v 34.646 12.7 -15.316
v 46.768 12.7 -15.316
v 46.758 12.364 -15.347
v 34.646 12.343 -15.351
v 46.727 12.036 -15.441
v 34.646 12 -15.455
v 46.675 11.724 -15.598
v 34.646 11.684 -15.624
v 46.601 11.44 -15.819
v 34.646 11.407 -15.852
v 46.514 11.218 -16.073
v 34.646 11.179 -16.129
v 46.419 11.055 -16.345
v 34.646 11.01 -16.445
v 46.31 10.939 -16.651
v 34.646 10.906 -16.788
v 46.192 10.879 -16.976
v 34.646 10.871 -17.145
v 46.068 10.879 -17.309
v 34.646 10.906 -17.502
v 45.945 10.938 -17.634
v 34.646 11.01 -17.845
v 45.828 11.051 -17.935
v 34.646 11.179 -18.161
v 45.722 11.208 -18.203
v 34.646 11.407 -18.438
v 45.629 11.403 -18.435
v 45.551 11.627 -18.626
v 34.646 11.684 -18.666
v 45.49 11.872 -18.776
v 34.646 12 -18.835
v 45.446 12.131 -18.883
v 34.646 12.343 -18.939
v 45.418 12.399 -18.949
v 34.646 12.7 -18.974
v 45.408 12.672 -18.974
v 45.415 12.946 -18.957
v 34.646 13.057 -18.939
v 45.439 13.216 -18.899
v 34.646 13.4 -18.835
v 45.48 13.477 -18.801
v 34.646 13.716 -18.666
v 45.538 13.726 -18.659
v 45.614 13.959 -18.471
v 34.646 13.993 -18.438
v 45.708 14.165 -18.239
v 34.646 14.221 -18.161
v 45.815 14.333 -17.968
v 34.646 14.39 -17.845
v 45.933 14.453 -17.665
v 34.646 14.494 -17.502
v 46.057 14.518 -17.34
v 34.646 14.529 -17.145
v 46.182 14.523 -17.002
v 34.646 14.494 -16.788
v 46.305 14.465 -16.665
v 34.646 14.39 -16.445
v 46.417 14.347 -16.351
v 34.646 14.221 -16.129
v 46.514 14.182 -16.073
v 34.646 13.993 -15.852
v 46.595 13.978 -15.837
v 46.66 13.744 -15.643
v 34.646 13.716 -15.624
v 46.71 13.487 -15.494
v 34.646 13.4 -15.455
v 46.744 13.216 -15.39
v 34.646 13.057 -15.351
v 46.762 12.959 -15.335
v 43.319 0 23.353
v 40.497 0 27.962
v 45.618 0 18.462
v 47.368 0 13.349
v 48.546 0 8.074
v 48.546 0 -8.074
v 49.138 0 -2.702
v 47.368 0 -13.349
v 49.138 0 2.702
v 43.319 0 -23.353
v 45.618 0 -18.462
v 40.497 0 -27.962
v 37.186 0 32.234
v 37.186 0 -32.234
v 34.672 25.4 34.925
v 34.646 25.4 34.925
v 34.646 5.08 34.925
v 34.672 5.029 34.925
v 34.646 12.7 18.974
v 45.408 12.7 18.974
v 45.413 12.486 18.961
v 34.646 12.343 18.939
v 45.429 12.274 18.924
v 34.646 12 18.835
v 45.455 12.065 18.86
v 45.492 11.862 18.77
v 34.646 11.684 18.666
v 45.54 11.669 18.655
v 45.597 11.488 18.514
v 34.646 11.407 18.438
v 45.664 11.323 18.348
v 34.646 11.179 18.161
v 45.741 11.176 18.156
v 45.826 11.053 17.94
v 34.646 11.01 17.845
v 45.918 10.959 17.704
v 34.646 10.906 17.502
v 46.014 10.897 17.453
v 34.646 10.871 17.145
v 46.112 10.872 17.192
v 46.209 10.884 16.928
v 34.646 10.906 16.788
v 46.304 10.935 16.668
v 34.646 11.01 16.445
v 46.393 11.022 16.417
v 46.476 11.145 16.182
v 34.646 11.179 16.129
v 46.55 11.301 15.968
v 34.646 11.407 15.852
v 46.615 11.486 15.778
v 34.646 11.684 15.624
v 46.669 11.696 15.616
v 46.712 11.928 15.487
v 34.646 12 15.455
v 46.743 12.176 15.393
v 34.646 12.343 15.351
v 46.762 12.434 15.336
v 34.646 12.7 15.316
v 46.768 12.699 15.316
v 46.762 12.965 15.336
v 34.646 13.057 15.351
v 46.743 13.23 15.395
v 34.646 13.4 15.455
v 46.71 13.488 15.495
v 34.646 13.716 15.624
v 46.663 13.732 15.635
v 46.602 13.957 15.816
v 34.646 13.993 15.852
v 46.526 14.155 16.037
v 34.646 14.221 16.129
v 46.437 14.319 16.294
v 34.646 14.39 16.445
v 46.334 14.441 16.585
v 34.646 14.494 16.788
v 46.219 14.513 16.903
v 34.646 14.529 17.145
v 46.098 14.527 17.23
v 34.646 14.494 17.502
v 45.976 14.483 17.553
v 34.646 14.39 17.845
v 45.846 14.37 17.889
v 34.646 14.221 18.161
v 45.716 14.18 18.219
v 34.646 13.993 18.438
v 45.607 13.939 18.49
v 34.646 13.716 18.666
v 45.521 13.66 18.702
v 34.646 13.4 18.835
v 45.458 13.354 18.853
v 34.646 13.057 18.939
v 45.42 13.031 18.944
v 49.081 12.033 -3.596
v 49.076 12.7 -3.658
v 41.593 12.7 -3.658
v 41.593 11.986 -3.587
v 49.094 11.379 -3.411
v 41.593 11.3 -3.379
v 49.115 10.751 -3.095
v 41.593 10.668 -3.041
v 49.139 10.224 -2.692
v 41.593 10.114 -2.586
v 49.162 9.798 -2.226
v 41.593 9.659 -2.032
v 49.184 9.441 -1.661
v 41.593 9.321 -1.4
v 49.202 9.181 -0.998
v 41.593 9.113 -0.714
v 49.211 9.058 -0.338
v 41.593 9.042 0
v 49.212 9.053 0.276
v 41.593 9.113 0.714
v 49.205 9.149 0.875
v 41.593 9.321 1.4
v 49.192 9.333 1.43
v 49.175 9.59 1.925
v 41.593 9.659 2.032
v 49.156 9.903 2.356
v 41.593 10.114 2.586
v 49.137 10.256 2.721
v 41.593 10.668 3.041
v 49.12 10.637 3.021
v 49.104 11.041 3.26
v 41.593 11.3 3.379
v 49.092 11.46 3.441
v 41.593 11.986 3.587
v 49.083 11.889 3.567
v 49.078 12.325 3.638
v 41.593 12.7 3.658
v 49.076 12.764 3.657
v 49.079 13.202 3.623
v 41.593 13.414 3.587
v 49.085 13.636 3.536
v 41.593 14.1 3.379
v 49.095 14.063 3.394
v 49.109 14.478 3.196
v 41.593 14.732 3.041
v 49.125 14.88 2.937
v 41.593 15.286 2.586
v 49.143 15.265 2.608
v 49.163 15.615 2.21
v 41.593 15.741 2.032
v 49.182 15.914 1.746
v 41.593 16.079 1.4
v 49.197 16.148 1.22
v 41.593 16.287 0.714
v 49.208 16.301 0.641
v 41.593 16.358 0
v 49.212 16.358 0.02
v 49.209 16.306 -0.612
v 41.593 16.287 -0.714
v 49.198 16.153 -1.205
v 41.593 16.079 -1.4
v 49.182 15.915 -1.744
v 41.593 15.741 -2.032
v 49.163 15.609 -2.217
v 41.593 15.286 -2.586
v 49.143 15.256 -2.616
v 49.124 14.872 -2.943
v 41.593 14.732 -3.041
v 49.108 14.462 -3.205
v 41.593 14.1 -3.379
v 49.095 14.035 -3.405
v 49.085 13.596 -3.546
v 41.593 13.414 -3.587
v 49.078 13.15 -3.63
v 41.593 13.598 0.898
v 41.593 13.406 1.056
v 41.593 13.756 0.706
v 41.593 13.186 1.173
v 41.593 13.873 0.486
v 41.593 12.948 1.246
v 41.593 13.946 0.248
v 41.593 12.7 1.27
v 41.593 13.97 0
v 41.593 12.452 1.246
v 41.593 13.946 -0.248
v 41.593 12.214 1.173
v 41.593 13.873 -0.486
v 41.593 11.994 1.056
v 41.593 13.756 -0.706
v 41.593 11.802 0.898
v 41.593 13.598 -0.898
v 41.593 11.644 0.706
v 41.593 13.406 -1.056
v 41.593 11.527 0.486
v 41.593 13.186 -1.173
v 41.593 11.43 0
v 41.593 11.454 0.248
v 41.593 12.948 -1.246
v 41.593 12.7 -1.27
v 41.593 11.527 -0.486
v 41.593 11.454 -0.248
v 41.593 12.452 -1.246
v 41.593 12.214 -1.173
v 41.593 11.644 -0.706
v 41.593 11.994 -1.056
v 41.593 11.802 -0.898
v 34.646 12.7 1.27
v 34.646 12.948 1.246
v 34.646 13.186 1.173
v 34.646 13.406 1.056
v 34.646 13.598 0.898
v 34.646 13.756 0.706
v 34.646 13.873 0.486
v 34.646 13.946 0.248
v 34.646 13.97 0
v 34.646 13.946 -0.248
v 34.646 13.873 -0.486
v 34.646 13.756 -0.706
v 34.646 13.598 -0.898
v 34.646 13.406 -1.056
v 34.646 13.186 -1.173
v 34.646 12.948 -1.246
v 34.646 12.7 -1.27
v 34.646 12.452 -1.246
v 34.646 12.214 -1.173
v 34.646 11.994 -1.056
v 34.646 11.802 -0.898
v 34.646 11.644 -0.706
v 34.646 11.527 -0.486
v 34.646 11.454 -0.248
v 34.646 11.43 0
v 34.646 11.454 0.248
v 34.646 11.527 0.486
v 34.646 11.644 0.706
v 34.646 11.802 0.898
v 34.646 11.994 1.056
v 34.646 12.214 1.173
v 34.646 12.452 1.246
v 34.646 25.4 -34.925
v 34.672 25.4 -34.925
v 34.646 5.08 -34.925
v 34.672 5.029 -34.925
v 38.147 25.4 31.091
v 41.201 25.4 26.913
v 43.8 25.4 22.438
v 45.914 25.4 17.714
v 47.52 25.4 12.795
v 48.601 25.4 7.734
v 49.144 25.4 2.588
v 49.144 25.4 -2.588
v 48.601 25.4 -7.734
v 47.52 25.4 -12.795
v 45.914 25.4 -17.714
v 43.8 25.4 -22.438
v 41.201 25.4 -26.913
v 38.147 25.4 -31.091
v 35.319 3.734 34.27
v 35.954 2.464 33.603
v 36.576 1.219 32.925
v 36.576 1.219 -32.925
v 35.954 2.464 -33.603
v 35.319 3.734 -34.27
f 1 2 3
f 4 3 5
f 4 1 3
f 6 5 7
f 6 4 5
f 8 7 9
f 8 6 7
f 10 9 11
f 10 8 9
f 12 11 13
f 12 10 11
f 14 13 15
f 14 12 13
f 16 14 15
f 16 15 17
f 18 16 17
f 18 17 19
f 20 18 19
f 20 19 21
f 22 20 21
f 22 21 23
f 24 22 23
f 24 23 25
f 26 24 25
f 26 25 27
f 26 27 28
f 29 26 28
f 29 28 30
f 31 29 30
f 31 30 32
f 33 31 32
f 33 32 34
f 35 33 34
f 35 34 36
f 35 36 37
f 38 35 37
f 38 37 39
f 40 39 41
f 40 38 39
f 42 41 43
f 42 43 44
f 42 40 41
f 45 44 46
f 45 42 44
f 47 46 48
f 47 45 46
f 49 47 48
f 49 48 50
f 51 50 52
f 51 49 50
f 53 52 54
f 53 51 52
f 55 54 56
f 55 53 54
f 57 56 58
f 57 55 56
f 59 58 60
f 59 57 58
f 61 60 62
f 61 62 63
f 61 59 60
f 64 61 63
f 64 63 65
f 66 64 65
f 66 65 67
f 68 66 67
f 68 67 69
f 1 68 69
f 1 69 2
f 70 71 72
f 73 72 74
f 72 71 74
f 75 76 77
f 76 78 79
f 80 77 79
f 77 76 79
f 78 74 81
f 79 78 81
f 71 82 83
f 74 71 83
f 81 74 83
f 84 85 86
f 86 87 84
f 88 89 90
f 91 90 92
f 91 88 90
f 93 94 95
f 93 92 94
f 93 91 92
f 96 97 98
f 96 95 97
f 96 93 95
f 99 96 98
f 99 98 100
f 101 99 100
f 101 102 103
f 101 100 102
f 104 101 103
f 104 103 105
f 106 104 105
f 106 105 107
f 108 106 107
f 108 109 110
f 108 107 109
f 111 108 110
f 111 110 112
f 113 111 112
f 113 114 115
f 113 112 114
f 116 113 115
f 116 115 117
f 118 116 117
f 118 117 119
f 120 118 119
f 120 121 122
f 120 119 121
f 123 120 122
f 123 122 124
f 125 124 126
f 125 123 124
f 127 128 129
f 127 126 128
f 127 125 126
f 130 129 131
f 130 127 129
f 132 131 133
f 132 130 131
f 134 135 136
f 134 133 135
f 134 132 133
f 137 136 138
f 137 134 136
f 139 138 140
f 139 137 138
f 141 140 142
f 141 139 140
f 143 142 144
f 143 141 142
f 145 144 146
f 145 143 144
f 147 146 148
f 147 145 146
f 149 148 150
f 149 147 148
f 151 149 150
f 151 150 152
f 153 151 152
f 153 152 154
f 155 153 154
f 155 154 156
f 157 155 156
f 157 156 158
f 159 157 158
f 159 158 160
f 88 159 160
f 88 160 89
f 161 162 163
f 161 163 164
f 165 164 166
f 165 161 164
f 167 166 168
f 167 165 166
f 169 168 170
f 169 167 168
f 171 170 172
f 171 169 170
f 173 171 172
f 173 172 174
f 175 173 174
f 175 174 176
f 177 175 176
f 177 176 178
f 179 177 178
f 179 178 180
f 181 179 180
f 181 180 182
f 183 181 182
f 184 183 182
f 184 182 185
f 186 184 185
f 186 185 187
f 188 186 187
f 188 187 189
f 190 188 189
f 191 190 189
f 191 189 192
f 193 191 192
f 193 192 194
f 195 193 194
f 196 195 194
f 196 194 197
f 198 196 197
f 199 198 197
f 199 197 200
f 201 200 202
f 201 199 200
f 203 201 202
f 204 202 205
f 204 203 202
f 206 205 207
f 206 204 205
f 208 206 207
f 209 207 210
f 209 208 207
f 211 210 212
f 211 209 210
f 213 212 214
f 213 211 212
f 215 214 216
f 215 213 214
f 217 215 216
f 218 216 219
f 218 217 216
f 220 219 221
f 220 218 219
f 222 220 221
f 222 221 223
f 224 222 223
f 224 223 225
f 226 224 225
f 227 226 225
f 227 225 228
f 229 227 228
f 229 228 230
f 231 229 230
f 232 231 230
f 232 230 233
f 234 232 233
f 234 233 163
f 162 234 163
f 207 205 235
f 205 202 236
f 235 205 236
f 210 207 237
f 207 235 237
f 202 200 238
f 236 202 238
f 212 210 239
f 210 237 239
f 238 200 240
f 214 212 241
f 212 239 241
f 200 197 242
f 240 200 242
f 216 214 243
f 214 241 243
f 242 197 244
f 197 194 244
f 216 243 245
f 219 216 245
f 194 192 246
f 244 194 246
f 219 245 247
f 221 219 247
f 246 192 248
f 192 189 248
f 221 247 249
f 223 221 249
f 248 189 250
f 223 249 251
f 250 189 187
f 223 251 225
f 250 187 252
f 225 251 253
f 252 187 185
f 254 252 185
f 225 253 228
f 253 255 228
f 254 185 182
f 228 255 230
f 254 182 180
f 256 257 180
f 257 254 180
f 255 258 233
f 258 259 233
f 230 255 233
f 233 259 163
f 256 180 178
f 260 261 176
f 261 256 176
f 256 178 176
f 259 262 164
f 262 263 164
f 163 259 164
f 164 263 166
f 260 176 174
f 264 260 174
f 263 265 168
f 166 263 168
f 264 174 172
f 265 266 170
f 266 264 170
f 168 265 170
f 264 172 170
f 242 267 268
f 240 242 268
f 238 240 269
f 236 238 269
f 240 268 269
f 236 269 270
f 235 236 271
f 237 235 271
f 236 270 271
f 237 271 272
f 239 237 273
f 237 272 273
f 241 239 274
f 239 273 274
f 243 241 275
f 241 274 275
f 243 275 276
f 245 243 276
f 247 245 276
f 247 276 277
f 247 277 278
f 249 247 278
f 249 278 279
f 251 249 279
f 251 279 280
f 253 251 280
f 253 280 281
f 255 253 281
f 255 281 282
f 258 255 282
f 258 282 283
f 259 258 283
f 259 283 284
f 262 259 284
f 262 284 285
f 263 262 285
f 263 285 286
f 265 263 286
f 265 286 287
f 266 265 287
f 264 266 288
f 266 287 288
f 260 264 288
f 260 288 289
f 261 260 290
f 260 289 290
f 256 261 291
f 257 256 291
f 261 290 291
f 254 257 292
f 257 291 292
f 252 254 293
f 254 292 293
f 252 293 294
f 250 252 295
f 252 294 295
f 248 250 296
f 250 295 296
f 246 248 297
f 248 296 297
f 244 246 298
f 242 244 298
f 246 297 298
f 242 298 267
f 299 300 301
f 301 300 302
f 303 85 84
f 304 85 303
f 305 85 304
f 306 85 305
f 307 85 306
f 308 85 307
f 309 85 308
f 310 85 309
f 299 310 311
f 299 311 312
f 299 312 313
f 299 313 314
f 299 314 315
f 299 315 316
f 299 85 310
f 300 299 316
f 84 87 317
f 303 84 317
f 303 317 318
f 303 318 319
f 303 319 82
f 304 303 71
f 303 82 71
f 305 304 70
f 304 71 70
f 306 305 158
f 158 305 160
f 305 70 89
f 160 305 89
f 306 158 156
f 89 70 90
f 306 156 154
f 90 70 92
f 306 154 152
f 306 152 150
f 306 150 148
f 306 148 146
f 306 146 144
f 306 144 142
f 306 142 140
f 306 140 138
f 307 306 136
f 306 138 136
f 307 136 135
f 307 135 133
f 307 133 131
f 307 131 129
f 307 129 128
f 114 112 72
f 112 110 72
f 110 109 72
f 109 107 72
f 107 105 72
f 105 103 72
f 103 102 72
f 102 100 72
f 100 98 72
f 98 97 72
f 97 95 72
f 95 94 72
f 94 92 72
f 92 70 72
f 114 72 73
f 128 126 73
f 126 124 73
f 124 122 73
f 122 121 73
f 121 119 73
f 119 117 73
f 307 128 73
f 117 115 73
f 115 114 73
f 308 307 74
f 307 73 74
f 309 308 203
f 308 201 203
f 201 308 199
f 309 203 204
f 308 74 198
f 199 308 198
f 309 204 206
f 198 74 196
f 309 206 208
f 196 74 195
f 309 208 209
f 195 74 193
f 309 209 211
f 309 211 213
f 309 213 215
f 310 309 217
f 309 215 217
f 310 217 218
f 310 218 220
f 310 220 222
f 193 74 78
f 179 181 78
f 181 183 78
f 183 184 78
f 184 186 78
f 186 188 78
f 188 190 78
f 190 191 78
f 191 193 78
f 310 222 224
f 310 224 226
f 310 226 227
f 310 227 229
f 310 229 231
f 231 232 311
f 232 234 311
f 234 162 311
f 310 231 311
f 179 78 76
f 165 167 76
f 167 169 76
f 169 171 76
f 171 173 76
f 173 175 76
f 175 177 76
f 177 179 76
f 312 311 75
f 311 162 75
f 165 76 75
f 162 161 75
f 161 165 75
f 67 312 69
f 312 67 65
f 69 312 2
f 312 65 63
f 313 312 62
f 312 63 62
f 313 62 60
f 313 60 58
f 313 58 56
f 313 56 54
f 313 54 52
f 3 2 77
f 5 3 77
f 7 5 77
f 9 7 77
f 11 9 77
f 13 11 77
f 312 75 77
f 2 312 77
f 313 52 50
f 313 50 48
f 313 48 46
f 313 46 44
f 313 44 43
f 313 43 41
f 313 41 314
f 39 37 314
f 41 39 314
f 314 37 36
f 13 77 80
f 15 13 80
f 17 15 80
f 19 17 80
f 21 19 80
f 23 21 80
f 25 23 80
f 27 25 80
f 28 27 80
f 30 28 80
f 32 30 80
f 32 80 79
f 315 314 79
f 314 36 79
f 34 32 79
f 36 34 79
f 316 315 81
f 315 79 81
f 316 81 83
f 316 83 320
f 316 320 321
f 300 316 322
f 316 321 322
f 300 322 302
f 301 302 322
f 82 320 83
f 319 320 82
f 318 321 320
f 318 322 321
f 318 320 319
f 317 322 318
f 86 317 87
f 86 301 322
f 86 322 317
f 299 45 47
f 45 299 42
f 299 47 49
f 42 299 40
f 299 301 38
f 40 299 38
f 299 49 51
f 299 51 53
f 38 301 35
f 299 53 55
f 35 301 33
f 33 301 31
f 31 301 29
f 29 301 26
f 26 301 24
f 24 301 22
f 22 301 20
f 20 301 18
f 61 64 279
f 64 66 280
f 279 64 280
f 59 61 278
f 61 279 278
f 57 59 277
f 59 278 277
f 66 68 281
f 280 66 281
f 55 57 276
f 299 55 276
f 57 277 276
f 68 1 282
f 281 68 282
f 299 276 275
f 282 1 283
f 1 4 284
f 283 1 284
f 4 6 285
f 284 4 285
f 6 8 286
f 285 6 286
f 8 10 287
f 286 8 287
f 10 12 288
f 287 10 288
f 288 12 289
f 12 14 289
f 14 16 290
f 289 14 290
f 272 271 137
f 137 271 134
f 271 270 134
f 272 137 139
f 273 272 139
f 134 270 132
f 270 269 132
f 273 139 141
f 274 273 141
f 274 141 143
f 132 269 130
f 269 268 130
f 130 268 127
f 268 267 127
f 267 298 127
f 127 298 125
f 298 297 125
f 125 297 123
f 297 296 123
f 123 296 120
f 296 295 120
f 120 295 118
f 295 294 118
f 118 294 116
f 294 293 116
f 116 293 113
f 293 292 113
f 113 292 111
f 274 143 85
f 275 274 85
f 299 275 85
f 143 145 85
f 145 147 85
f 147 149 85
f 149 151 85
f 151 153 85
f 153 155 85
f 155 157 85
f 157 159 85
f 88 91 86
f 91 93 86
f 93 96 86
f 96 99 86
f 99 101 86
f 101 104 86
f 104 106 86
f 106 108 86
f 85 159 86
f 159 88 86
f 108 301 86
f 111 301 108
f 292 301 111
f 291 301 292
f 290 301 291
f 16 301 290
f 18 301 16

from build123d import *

# Parameters (mm, degrees)
BOSS_EXTRUDE1_DEPTH     = 25.4
CUT_EXTRUDE2_REACH      = 47.575
CUT_EXTRUDE2_END_RADIUS = 49.2125
SKETCH4_R               = 1.27
CUT_EXTRUDE4_START      = -14.566377
SKETCH11_R              = 3.6576
CUT_EXTRUDE4_DEPTH      = 7.62
CUT_EXTRUDE5_REACH      = 67.474
CUT_EXTRUDE5_END_RADIUS = 49.2125
SKETCH15_R              = 1.8288
CHAMFER1_SIZE           = 2.54
CHAMFER1_SIZE2          = 5.08


with BuildPart() as part:
    # Sketch2 → Boss-Extrude1 (new body)
    with BuildSketch(Plane(origin=(0, 0, 0), x_dir=(1, 0, 0), z_dir=(0, 1, 0))):
        with BuildLine():
            Line((34.671523348, 34.925), (34.646123348, 34.925))
            Line((34.646123348, 34.925), (34.646123348, -34.925))
            Line((34.646123348, -34.925), (34.671523348, -34.925))
            ThreePointArc((34.671523348, -34.925), (49.2125, 0), (34.671523348, 34.925))
        make_face()
    extrude(amount=BOSS_EXTRUDE1_DEPTH)

    # Cut-Extrude2: up to this cylinder (the profile starts inside it)
    cut_extrude2_end = Plane(origin=(0, 12.7, 0), z_dir=(0, -1, 0)) * Cylinder(CUT_EXTRUDE2_END_RADIUS, 194.575, mode=Mode.PRIVATE)
    # Sketch4 → Cut-Extrude2 (cut, up to the surface)
    with BuildSketch(Plane.ZY.offset(-34.646123348), mode=Mode.PRIVATE) as cut_extrude2_sk1:
        with Locations((0, 12.7)):
            Circle(SKETCH4_R)
    cut_extrude2_tool1 = extrude(cut_extrude2_sk1.sketch, amount=-CUT_EXTRUDE2_REACH, mode=Mode.PRIVATE) & cut_extrude2_end
    add(cut_extrude2_tool1.solids().sort_by_distance((34.646123, 12.7, 0))[0], mode=Mode.SUBTRACT)

    # Sketch11 → Cut-Extrude4 (cut)
    with BuildSketch(Plane.ZY.offset(-34.646123348).offset(CUT_EXTRUDE4_START)):
        with Locations(Location((0, 12.7, 0), (0, 0, 180))):
            Circle(SKETCH11_R)
    extrude(amount=CUT_EXTRUDE4_DEPTH, mode=Mode.SUBTRACT)

    # Cut-Extrude5: up to this cylinder (the profile starts inside it)
    cut_extrude5_end = Plane(origin=(0, 12.7, 0), z_dir=(0, -1, 0)) * Cylinder(CUT_EXTRUDE5_END_RADIUS, 235.925334, mode=Mode.PRIVATE)
    # Sketch15 → Cut-Extrude5 (cut, up to the surface)
    with BuildSketch(Plane(origin=(0, 0, 0), x_dir=(0, 0, -1), z_dir=(1, 0, 0)), mode=Mode.PRIVATE) as cut_extrude5_sk1:
        with BuildLine():
            ThreePointArc((-18.9738, 12.7), (-17.145, 10.8712), (-15.3162, 12.7))
            Line((-15.3162, 12.7), (-18.9738, 12.7))
        make_face()
    cut_extrude5_tool1 = extrude(cut_extrude5_sk1.sketch, amount=CUT_EXTRUDE5_REACH, mode=Mode.PRIVATE) & cut_extrude5_end
    add(cut_extrude5_tool1.solids().sort_by_distance((0, 11.923833, 17.145))[0], mode=Mode.SUBTRACT)
    # Sketch15 → Cut-Extrude5 (cut, up to the surface)
    with BuildSketch(Plane(origin=(0, 0, 0), x_dir=(0, 0, -1), z_dir=(1, 0, 0)), mode=Mode.PRIVATE) as cut_extrude5_sk2:
        with BuildLine():
            Line((-18.9738, 12.7), (-15.3162, 12.7))
            ThreePointArc((-15.3162, 12.7), (-17.145, 14.5288), (-18.9738, 12.7))
        make_face()
    cut_extrude5_tool2 = extrude(cut_extrude5_sk2.sketch, amount=CUT_EXTRUDE5_REACH, mode=Mode.PRIVATE) & cut_extrude5_end
    add(cut_extrude5_tool2.solids().sort_by_distance((0, 13.476167, 17.145))[0], mode=Mode.SUBTRACT)
    # Sketch15 → Cut-Extrude5 (cut, up to the surface)
    with BuildSketch(Plane(origin=(0, 0, 0), x_dir=(0, 0, -1), z_dir=(1, 0, 0)), mode=Mode.PRIVATE) as cut_extrude5_sk3:
        with Locations(Location((17.145, 12.7, 0), (0, 0, 180))):
            Circle(SKETCH15_R)
    cut_extrude5_tool3 = extrude(cut_extrude5_sk3.sketch, amount=CUT_EXTRUDE5_REACH, mode=Mode.PRIVATE) & cut_extrude5_end
    add(cut_extrude5_tool3.solids().sort_by_distance((0, 12.7, -17.145))[0], mode=Mode.SUBTRACT)

    # Chamfer1
    chamfer1_edges = [part.edges().sort_by_distance(p)[0] for p in [
        (34.646123348, 0, 0),
    ]]
    chamfer1_side = [part.faces().sort_by_distance(p)[0] for p in [
        (40.553555626, 0, 0),
    ]]
    chamfer(chamfer1_edges, length=CHAMFER1_SIZE, length2=CHAMFER1_SIZE2, reference=chamfer1_side[0])


solid = part.part
